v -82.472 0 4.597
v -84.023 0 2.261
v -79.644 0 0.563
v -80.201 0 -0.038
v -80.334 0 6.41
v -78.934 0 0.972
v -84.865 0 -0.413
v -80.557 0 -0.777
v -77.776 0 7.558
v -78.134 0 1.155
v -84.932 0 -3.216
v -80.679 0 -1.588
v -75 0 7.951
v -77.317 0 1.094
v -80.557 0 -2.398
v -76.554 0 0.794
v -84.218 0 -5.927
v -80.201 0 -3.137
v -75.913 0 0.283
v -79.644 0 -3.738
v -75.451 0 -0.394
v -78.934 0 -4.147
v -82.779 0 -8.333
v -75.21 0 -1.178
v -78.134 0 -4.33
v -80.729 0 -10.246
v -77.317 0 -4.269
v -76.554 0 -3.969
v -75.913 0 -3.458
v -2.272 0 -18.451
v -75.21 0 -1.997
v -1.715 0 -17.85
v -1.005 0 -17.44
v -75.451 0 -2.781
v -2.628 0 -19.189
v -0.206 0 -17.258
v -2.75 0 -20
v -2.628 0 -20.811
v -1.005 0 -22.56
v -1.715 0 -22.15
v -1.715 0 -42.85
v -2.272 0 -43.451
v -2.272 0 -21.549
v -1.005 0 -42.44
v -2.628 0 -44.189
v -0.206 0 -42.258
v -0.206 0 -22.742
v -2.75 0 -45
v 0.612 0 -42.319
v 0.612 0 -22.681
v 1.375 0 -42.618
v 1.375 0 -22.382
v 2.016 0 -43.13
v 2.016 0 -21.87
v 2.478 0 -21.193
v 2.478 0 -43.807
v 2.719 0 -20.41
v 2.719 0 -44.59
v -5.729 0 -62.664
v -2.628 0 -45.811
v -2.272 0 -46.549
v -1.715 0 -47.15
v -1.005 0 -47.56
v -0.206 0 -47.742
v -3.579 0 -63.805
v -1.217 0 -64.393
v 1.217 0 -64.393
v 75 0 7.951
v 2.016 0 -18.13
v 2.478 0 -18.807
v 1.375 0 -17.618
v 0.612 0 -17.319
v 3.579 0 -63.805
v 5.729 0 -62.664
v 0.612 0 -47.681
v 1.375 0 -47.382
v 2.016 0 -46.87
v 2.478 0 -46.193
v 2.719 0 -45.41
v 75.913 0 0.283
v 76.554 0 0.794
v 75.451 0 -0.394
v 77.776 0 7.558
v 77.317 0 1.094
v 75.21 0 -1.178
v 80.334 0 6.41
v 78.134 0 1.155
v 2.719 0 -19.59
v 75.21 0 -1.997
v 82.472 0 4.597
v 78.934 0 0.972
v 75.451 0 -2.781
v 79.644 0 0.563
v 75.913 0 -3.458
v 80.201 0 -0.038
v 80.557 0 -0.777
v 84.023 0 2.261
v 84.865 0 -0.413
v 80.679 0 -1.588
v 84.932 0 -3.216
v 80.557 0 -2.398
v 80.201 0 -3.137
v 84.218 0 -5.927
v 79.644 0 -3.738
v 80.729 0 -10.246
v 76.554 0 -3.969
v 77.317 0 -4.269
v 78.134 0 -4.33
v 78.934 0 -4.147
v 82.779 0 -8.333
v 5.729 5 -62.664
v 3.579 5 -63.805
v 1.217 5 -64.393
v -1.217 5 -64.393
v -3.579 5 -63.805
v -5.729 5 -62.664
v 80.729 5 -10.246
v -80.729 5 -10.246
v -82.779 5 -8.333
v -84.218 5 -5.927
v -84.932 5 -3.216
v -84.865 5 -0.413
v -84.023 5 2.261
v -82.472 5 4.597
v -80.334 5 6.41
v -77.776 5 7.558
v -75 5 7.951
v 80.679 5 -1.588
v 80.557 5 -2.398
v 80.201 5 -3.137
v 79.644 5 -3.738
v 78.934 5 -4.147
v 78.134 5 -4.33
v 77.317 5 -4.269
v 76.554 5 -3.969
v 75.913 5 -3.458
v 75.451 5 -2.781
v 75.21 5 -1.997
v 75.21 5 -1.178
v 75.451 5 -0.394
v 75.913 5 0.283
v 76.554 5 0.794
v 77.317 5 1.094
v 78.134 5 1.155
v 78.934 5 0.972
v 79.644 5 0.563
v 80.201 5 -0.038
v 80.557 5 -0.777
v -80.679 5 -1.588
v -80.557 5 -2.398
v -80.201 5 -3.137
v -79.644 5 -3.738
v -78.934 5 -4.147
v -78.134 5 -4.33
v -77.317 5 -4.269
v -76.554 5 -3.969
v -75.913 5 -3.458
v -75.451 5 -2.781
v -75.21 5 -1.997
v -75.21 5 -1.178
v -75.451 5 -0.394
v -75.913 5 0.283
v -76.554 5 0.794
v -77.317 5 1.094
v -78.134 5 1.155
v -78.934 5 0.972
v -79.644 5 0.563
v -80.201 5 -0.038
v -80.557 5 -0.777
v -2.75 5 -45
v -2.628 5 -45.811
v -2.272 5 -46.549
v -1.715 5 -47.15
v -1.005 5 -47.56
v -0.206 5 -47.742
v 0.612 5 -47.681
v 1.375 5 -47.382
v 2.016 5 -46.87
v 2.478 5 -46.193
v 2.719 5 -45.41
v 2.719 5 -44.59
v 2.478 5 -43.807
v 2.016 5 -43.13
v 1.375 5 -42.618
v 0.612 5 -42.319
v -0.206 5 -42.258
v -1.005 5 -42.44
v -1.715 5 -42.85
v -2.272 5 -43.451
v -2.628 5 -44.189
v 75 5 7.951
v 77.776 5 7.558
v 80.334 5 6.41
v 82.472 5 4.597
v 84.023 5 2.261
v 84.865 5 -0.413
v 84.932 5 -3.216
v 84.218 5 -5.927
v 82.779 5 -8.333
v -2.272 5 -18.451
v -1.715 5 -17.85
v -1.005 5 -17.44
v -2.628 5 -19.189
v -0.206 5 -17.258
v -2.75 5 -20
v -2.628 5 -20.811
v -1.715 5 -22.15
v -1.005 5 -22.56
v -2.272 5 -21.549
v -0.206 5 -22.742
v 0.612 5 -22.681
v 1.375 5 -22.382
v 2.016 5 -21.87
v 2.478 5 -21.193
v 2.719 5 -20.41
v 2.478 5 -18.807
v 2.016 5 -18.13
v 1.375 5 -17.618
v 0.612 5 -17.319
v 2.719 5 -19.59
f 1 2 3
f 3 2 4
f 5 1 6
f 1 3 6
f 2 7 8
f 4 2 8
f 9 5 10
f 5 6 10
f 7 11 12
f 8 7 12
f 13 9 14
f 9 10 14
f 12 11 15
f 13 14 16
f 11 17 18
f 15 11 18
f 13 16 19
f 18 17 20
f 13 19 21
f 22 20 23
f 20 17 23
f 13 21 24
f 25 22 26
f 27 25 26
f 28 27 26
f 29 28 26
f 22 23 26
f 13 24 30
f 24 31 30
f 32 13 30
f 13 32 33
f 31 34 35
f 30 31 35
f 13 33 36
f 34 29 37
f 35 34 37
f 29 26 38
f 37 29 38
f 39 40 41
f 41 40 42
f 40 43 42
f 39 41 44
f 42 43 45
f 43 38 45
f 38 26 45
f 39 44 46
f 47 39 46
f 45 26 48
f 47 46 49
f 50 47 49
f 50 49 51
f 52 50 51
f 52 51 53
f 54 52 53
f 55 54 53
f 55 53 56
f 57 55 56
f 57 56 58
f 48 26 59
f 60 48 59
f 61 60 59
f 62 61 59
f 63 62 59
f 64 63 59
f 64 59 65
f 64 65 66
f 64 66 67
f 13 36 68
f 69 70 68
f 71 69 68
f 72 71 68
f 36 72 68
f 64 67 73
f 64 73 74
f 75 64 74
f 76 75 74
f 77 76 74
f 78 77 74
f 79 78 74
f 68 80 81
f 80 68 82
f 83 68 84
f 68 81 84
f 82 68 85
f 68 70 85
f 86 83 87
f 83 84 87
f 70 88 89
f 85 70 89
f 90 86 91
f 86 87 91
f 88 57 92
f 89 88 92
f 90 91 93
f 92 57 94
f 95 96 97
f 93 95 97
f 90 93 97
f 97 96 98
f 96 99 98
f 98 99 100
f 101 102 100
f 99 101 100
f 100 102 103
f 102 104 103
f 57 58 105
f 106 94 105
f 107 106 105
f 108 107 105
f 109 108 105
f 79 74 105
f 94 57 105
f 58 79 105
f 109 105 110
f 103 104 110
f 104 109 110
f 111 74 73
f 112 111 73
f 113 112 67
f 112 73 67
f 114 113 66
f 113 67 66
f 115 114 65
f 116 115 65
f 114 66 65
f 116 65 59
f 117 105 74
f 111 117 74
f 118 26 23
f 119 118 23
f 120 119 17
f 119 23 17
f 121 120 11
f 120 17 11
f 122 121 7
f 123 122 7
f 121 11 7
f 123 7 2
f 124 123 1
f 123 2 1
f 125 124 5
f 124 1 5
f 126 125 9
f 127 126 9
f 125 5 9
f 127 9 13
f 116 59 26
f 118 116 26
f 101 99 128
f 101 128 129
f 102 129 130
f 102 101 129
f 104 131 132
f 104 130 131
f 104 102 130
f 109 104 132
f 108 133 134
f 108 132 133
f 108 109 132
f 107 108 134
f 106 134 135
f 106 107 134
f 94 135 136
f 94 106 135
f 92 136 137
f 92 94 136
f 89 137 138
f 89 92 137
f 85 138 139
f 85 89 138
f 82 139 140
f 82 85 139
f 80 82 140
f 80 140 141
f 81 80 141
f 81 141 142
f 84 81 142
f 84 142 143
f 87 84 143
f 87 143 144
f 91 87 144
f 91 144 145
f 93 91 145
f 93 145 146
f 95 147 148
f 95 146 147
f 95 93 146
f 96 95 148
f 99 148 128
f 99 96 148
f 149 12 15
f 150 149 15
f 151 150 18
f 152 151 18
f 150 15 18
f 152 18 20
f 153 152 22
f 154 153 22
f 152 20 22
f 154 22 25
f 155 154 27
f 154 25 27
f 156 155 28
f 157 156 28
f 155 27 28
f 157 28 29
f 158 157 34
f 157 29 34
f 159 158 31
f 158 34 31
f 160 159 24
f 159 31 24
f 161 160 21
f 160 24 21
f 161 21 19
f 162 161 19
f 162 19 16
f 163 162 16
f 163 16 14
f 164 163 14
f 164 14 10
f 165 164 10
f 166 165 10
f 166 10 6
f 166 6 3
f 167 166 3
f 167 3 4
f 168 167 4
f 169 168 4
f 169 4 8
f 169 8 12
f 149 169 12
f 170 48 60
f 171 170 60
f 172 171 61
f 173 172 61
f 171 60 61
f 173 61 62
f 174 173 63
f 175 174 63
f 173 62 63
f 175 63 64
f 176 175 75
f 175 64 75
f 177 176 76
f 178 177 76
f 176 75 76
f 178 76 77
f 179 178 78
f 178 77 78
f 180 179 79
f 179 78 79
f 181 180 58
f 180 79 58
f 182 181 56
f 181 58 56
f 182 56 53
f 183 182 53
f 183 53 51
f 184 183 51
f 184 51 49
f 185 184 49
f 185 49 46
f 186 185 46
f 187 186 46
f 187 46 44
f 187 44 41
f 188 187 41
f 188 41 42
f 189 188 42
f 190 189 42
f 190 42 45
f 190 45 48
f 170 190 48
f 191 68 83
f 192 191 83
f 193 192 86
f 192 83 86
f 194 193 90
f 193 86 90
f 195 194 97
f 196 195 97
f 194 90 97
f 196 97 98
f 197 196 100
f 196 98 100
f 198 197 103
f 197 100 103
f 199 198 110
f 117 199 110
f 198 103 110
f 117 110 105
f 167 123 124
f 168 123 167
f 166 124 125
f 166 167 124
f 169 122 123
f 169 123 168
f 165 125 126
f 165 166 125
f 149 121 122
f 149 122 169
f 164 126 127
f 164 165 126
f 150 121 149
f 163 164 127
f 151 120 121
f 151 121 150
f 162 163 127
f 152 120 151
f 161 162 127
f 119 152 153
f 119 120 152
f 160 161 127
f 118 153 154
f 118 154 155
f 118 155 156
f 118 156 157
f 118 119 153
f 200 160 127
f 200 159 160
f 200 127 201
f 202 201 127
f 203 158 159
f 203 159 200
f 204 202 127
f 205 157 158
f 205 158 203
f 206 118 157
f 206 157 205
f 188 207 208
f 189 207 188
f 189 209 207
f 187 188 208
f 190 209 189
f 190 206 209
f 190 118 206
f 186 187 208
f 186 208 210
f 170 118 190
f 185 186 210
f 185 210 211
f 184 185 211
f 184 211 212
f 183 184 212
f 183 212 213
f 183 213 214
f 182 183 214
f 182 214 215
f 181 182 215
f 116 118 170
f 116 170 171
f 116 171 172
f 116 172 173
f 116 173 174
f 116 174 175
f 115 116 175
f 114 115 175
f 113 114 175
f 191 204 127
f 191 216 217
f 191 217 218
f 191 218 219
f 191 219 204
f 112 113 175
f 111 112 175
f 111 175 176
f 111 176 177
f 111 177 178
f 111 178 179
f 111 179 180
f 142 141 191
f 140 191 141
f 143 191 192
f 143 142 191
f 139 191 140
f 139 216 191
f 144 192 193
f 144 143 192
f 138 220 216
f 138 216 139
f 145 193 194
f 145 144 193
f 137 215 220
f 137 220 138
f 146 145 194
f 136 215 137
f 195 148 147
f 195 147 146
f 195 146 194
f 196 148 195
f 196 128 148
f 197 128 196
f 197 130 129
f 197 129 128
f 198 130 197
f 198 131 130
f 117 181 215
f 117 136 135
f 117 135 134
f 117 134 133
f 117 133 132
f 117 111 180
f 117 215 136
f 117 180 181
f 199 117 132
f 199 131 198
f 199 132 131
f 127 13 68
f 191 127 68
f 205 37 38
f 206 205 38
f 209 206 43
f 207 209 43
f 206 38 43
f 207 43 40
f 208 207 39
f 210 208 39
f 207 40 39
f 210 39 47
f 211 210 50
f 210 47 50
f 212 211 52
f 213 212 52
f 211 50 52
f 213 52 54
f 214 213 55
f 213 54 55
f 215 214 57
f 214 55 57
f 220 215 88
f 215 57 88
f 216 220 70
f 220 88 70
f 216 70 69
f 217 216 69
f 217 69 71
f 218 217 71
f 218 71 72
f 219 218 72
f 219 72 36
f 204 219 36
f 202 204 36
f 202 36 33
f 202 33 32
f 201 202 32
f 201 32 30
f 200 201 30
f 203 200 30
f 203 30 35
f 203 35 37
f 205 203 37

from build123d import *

# Parameters (mm, degrees)
BOSS_EXTRUDE1_DEPTH  = 5
M5_CLEARANCE_HOLE1_D = 5.5
M5_CLEARANCE_HOLE2_D = 5.5


with BuildPart() as part:
    # Sketch2 → Boss-Extrude1 (new body)
    with BuildSketch(Plane(origin=(0, 0, 0), x_dir=(1, 0, 0), z_dir=(0, 1, 0))):
        with BuildLine():
            Line((-5.72861373, 62.663882494), (-80.72861373, 10.24579688))
            ThreePointArc((-80.72861373, 10.24579688), (-84.538480676, -0.953622176), (-75, -7.950725842))
            Line((-75, -7.950725842), (75, -7.950725842))
            ThreePointArc((75, -7.950725842), (84.538480676, -0.953622176), (80.72861373, 10.24579688))
            Line((80.72861373, 10.24579688), (5.72861373, 62.663882494))
            ThreePointArc((5.72861373, 62.663882494), (0, 64.467359772), (-5.72861373, 62.663882494))
        make_face()
    extrude(amount=BOSS_EXTRUDE1_DEPTH)

    # M5 Clearance Hole1 (through all)
    with Locations(Plane(origin=(0, 5, 0), x_dir=(1, 0, 0), z_dir=(0, 1, 0))):
        with Locations((0, 45), (0, 20)):
            Hole(M5_CLEARANCE_HOLE1_D / 2)

    # M5 Clearance Hole2 (through all)
    with Locations(Plane(origin=(0, 5, 0), x_dir=(1, 0, 0), z_dir=(0, 1, 0))):
        with Locations((-77.928915997, 1.587505431)):
            m5_clearance_hole2 = Hole(M5_CLEARANCE_HOLE2_D / 2)

    # Mirror1: M5 Clearance Hole2 across plane
    add(m5_clearance_hole2.mirror(Plane(origin=(0, 0, 0), x_dir=(0, 0, 1), z_dir=(1, 0, 0))), mode=Mode.SUBTRACT)


solid = part.part
